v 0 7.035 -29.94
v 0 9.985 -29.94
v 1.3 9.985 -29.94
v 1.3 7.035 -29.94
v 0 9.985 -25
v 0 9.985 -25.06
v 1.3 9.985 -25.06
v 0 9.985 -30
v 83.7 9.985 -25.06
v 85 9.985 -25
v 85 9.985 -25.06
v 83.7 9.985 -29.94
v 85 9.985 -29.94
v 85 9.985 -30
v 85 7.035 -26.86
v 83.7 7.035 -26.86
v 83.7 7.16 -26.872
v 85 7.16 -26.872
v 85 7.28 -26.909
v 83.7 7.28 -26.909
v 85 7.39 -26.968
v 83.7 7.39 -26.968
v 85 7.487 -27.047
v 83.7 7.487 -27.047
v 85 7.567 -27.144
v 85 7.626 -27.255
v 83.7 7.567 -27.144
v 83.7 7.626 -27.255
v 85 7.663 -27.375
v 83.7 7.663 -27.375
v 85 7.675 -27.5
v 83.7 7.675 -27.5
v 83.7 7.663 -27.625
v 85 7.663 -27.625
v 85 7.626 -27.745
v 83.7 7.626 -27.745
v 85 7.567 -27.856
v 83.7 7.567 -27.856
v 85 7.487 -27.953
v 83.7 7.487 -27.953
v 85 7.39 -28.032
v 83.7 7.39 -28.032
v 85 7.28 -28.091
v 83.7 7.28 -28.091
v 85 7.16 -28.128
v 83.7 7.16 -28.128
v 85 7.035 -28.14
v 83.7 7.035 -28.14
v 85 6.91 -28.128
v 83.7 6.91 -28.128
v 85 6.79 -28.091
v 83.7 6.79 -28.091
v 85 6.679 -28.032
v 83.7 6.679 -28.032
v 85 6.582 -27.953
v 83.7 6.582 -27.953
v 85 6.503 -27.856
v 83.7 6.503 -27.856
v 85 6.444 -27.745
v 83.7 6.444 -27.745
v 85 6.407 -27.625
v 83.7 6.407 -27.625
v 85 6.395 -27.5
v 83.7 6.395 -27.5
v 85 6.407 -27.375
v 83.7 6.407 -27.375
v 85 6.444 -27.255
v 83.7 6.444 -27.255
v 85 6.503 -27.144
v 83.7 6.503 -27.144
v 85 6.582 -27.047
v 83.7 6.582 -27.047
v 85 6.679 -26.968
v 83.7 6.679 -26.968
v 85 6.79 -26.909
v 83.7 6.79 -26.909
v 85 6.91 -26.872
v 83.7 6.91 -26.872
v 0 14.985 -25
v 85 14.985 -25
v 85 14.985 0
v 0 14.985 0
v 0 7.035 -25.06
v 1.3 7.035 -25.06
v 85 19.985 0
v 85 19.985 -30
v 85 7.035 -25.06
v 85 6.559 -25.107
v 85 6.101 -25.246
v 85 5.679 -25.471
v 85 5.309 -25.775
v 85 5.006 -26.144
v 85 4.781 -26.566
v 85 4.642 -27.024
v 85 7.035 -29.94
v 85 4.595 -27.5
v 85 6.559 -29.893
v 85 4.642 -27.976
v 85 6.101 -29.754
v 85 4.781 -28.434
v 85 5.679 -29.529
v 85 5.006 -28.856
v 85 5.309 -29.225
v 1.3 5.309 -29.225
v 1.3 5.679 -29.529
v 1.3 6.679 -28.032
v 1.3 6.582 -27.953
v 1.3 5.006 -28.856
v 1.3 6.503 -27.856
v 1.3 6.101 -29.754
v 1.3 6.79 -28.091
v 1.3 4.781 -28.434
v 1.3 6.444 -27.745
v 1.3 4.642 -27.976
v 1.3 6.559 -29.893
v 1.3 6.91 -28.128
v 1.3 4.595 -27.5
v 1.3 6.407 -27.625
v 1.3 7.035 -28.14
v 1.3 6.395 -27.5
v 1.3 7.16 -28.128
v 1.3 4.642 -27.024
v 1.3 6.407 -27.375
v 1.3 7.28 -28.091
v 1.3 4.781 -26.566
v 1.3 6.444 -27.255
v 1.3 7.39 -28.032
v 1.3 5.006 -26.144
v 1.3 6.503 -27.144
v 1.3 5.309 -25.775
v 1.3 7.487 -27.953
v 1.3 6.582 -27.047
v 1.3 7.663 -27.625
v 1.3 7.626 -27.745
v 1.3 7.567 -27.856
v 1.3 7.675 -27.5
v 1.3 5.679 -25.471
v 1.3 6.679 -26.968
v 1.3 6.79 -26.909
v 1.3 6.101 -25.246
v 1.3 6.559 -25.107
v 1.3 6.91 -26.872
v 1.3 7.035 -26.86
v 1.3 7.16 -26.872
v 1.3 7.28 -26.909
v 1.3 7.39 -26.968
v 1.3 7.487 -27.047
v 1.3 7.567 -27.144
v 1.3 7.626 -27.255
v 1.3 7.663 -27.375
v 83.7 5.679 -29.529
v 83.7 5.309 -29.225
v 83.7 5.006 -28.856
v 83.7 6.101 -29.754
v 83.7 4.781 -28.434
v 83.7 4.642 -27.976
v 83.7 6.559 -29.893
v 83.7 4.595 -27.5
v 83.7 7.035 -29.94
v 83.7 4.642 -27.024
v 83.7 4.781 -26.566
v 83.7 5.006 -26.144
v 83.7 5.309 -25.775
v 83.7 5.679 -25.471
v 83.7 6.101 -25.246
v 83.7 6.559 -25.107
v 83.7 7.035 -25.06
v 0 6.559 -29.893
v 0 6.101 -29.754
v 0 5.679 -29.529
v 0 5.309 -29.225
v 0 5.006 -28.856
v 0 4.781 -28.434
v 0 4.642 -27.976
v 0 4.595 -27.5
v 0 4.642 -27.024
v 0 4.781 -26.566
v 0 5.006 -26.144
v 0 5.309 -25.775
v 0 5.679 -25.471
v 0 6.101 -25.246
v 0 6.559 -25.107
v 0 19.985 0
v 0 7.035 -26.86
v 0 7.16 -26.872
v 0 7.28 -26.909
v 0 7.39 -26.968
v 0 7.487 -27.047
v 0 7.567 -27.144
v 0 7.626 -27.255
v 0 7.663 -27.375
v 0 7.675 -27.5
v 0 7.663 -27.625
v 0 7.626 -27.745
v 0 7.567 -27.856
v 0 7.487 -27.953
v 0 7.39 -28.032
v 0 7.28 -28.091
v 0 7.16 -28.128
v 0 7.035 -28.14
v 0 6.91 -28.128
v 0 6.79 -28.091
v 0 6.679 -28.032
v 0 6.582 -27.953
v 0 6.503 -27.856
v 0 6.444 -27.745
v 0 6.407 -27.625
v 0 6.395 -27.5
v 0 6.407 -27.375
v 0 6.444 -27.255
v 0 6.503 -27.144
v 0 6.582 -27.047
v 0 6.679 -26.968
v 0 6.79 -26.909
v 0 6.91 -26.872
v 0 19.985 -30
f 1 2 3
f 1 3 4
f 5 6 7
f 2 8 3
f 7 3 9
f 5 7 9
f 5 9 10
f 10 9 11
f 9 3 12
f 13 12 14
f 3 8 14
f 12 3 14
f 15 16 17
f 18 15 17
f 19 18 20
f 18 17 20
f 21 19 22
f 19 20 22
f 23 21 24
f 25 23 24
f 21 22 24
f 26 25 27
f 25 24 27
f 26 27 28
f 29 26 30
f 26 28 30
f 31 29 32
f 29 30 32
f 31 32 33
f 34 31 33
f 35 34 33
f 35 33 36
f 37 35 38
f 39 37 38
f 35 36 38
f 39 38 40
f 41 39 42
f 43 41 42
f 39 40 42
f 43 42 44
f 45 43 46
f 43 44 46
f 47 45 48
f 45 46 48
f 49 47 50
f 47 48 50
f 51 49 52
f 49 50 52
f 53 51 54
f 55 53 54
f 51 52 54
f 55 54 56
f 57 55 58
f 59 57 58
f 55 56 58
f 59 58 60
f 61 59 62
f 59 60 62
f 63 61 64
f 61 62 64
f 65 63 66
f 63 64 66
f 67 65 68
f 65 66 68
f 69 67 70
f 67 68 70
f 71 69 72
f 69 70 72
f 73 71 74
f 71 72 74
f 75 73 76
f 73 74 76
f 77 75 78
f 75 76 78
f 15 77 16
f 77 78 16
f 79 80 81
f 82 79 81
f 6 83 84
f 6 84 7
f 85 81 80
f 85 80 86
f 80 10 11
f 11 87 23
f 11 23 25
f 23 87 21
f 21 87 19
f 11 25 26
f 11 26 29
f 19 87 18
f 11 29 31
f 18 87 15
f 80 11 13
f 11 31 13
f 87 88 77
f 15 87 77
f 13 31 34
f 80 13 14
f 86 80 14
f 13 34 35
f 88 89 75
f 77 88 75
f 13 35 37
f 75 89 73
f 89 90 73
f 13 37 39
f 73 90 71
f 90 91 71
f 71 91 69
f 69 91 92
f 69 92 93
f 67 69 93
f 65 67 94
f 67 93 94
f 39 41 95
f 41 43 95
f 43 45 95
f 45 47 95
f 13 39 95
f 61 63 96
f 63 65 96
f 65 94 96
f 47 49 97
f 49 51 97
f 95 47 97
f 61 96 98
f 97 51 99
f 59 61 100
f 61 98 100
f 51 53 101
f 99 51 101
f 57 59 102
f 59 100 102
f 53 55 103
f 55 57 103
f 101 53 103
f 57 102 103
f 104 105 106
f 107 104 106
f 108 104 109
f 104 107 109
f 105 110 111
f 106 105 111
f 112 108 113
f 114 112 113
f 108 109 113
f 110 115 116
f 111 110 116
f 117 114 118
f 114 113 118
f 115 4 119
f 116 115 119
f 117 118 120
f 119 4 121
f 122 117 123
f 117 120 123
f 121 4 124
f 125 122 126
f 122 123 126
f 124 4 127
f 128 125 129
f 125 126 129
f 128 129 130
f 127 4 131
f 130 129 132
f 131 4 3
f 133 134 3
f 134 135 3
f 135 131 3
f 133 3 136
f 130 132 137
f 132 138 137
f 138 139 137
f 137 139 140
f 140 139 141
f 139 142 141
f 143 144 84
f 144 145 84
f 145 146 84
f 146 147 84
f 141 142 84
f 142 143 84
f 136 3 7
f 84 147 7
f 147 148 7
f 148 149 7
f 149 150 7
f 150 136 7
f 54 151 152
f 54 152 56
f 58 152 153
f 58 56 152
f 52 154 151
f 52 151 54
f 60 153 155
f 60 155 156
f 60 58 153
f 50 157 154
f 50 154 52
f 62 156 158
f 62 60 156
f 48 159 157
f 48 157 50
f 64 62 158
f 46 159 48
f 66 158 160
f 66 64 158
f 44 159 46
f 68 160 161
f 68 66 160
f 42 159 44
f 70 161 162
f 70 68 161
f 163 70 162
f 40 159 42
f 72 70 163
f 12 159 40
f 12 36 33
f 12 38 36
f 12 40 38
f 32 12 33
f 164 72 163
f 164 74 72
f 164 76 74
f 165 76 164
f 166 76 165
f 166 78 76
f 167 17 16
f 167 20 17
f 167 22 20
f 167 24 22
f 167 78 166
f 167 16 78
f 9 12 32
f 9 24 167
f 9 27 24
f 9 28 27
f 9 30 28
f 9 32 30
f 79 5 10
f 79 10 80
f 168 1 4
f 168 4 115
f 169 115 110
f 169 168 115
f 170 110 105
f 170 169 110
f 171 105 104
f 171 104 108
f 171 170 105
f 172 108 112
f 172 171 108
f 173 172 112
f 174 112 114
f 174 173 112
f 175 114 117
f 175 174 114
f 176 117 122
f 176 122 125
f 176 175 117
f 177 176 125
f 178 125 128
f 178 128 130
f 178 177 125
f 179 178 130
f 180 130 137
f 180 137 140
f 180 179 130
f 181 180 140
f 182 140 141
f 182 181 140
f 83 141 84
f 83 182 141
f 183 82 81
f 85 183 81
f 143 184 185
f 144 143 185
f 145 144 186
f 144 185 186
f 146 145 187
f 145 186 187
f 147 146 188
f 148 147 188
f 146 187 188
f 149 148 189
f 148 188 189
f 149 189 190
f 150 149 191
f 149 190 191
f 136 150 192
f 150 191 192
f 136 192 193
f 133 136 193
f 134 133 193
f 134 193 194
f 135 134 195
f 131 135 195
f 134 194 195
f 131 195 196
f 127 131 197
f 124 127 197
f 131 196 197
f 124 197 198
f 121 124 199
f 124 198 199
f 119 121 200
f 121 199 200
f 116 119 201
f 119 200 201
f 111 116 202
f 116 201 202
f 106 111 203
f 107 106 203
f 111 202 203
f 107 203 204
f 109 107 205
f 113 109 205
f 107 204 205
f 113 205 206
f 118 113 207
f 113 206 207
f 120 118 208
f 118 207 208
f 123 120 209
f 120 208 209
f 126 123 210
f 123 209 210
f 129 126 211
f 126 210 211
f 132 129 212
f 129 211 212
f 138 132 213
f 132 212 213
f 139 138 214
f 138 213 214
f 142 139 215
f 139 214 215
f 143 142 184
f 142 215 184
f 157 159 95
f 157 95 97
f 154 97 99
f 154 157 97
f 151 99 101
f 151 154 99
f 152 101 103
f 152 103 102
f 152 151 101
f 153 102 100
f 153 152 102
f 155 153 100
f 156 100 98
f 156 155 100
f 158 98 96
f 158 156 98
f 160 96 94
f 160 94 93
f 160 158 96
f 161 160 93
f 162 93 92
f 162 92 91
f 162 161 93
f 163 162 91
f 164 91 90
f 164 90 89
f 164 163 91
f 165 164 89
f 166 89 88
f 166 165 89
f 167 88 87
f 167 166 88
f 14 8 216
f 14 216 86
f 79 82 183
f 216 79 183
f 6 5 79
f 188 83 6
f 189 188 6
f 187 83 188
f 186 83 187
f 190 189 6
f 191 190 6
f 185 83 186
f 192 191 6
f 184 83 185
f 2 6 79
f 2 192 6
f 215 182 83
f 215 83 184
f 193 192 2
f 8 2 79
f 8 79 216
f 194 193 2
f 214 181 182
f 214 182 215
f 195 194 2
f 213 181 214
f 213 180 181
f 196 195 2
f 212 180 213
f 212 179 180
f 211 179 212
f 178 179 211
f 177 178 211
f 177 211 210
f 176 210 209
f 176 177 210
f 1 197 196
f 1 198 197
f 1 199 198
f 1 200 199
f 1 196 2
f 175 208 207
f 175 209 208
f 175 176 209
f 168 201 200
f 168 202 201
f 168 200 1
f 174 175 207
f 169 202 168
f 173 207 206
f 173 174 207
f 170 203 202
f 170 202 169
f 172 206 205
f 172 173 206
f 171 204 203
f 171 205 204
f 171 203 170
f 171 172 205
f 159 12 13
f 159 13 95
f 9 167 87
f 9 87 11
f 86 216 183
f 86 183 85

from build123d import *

# Parameters (mm, degrees)
SKETCH1_W             = 85
SKETCH1_H             = 30
TOP_SURFACE_DEPTH     = 10
SKETCH6_W             = 25
SKETCH6_H             = 5
TOP_SURFACE_CUT_DEPTH = 91.691785736
SKETCH8_R             = 0.64
BOSS_EXTRUDE2_DEPTH   = 1.3
LPATTERN2_COUNT       = 2
LPATTERN2_PITCH       = 83.7


with BuildPart() as part:
    # Sketch1 → Top surface (new body)
    with BuildSketch(Plane(origin=(0, 0, 0), x_dir=(1, 0, 0), z_dir=(0, 1, 0))):
        with Locations((42.5, 15)):
            Rectangle(SKETCH1_W, SKETCH1_H)
    extrude(amount=TOP_SURFACE_DEPTH)

    # Sketch6 → Top surface cut (cut, through all)
    with BuildSketch(Plane.ZY):
        with Locations((-12.5, 2.5)):
            Rectangle(SKETCH6_W, SKETCH6_H)
    extrude(amount=-TOP_SURFACE_CUT_DEPTH, mode=Mode.SUBTRACT)


with BuildPart() as part_1:
    # Body-Move/Copy1: moved
    add(part.part.moved(Location((0, 9.984827234, 0))))

    # Sketch8 → Boss-Extrude2 (add)
    with BuildSketch(Plane.ZY):
        with BuildLine():
            Line((-25.06, 9.984827234), (-29.94, 9.984827234))
            Line((-29.94, 9.984827234), (-29.94, 7.034827234))
            ThreePointArc((-29.94, 7.034827234), (-27.5, 4.594827234), (-25.06, 7.034827234))
            Line((-25.06, 7.034827234), (-25.06, 9.984827234))
        make_face()
        with Locations((-27.5, 7.034827234)):
            Circle(SKETCH8_R, mode=Mode.SUBTRACT)
    boss_extrude2 = extrude(amount=-BOSS_EXTRUDE2_DEPTH)

    # LPattern2: Boss-Extrude2 ×2
    with Locations(*[(i * LPATTERN2_PITCH, 0, 0) for i in range(1, LPATTERN2_COUNT)]):
        add(boss_extrude2)


solid = part_1.part
